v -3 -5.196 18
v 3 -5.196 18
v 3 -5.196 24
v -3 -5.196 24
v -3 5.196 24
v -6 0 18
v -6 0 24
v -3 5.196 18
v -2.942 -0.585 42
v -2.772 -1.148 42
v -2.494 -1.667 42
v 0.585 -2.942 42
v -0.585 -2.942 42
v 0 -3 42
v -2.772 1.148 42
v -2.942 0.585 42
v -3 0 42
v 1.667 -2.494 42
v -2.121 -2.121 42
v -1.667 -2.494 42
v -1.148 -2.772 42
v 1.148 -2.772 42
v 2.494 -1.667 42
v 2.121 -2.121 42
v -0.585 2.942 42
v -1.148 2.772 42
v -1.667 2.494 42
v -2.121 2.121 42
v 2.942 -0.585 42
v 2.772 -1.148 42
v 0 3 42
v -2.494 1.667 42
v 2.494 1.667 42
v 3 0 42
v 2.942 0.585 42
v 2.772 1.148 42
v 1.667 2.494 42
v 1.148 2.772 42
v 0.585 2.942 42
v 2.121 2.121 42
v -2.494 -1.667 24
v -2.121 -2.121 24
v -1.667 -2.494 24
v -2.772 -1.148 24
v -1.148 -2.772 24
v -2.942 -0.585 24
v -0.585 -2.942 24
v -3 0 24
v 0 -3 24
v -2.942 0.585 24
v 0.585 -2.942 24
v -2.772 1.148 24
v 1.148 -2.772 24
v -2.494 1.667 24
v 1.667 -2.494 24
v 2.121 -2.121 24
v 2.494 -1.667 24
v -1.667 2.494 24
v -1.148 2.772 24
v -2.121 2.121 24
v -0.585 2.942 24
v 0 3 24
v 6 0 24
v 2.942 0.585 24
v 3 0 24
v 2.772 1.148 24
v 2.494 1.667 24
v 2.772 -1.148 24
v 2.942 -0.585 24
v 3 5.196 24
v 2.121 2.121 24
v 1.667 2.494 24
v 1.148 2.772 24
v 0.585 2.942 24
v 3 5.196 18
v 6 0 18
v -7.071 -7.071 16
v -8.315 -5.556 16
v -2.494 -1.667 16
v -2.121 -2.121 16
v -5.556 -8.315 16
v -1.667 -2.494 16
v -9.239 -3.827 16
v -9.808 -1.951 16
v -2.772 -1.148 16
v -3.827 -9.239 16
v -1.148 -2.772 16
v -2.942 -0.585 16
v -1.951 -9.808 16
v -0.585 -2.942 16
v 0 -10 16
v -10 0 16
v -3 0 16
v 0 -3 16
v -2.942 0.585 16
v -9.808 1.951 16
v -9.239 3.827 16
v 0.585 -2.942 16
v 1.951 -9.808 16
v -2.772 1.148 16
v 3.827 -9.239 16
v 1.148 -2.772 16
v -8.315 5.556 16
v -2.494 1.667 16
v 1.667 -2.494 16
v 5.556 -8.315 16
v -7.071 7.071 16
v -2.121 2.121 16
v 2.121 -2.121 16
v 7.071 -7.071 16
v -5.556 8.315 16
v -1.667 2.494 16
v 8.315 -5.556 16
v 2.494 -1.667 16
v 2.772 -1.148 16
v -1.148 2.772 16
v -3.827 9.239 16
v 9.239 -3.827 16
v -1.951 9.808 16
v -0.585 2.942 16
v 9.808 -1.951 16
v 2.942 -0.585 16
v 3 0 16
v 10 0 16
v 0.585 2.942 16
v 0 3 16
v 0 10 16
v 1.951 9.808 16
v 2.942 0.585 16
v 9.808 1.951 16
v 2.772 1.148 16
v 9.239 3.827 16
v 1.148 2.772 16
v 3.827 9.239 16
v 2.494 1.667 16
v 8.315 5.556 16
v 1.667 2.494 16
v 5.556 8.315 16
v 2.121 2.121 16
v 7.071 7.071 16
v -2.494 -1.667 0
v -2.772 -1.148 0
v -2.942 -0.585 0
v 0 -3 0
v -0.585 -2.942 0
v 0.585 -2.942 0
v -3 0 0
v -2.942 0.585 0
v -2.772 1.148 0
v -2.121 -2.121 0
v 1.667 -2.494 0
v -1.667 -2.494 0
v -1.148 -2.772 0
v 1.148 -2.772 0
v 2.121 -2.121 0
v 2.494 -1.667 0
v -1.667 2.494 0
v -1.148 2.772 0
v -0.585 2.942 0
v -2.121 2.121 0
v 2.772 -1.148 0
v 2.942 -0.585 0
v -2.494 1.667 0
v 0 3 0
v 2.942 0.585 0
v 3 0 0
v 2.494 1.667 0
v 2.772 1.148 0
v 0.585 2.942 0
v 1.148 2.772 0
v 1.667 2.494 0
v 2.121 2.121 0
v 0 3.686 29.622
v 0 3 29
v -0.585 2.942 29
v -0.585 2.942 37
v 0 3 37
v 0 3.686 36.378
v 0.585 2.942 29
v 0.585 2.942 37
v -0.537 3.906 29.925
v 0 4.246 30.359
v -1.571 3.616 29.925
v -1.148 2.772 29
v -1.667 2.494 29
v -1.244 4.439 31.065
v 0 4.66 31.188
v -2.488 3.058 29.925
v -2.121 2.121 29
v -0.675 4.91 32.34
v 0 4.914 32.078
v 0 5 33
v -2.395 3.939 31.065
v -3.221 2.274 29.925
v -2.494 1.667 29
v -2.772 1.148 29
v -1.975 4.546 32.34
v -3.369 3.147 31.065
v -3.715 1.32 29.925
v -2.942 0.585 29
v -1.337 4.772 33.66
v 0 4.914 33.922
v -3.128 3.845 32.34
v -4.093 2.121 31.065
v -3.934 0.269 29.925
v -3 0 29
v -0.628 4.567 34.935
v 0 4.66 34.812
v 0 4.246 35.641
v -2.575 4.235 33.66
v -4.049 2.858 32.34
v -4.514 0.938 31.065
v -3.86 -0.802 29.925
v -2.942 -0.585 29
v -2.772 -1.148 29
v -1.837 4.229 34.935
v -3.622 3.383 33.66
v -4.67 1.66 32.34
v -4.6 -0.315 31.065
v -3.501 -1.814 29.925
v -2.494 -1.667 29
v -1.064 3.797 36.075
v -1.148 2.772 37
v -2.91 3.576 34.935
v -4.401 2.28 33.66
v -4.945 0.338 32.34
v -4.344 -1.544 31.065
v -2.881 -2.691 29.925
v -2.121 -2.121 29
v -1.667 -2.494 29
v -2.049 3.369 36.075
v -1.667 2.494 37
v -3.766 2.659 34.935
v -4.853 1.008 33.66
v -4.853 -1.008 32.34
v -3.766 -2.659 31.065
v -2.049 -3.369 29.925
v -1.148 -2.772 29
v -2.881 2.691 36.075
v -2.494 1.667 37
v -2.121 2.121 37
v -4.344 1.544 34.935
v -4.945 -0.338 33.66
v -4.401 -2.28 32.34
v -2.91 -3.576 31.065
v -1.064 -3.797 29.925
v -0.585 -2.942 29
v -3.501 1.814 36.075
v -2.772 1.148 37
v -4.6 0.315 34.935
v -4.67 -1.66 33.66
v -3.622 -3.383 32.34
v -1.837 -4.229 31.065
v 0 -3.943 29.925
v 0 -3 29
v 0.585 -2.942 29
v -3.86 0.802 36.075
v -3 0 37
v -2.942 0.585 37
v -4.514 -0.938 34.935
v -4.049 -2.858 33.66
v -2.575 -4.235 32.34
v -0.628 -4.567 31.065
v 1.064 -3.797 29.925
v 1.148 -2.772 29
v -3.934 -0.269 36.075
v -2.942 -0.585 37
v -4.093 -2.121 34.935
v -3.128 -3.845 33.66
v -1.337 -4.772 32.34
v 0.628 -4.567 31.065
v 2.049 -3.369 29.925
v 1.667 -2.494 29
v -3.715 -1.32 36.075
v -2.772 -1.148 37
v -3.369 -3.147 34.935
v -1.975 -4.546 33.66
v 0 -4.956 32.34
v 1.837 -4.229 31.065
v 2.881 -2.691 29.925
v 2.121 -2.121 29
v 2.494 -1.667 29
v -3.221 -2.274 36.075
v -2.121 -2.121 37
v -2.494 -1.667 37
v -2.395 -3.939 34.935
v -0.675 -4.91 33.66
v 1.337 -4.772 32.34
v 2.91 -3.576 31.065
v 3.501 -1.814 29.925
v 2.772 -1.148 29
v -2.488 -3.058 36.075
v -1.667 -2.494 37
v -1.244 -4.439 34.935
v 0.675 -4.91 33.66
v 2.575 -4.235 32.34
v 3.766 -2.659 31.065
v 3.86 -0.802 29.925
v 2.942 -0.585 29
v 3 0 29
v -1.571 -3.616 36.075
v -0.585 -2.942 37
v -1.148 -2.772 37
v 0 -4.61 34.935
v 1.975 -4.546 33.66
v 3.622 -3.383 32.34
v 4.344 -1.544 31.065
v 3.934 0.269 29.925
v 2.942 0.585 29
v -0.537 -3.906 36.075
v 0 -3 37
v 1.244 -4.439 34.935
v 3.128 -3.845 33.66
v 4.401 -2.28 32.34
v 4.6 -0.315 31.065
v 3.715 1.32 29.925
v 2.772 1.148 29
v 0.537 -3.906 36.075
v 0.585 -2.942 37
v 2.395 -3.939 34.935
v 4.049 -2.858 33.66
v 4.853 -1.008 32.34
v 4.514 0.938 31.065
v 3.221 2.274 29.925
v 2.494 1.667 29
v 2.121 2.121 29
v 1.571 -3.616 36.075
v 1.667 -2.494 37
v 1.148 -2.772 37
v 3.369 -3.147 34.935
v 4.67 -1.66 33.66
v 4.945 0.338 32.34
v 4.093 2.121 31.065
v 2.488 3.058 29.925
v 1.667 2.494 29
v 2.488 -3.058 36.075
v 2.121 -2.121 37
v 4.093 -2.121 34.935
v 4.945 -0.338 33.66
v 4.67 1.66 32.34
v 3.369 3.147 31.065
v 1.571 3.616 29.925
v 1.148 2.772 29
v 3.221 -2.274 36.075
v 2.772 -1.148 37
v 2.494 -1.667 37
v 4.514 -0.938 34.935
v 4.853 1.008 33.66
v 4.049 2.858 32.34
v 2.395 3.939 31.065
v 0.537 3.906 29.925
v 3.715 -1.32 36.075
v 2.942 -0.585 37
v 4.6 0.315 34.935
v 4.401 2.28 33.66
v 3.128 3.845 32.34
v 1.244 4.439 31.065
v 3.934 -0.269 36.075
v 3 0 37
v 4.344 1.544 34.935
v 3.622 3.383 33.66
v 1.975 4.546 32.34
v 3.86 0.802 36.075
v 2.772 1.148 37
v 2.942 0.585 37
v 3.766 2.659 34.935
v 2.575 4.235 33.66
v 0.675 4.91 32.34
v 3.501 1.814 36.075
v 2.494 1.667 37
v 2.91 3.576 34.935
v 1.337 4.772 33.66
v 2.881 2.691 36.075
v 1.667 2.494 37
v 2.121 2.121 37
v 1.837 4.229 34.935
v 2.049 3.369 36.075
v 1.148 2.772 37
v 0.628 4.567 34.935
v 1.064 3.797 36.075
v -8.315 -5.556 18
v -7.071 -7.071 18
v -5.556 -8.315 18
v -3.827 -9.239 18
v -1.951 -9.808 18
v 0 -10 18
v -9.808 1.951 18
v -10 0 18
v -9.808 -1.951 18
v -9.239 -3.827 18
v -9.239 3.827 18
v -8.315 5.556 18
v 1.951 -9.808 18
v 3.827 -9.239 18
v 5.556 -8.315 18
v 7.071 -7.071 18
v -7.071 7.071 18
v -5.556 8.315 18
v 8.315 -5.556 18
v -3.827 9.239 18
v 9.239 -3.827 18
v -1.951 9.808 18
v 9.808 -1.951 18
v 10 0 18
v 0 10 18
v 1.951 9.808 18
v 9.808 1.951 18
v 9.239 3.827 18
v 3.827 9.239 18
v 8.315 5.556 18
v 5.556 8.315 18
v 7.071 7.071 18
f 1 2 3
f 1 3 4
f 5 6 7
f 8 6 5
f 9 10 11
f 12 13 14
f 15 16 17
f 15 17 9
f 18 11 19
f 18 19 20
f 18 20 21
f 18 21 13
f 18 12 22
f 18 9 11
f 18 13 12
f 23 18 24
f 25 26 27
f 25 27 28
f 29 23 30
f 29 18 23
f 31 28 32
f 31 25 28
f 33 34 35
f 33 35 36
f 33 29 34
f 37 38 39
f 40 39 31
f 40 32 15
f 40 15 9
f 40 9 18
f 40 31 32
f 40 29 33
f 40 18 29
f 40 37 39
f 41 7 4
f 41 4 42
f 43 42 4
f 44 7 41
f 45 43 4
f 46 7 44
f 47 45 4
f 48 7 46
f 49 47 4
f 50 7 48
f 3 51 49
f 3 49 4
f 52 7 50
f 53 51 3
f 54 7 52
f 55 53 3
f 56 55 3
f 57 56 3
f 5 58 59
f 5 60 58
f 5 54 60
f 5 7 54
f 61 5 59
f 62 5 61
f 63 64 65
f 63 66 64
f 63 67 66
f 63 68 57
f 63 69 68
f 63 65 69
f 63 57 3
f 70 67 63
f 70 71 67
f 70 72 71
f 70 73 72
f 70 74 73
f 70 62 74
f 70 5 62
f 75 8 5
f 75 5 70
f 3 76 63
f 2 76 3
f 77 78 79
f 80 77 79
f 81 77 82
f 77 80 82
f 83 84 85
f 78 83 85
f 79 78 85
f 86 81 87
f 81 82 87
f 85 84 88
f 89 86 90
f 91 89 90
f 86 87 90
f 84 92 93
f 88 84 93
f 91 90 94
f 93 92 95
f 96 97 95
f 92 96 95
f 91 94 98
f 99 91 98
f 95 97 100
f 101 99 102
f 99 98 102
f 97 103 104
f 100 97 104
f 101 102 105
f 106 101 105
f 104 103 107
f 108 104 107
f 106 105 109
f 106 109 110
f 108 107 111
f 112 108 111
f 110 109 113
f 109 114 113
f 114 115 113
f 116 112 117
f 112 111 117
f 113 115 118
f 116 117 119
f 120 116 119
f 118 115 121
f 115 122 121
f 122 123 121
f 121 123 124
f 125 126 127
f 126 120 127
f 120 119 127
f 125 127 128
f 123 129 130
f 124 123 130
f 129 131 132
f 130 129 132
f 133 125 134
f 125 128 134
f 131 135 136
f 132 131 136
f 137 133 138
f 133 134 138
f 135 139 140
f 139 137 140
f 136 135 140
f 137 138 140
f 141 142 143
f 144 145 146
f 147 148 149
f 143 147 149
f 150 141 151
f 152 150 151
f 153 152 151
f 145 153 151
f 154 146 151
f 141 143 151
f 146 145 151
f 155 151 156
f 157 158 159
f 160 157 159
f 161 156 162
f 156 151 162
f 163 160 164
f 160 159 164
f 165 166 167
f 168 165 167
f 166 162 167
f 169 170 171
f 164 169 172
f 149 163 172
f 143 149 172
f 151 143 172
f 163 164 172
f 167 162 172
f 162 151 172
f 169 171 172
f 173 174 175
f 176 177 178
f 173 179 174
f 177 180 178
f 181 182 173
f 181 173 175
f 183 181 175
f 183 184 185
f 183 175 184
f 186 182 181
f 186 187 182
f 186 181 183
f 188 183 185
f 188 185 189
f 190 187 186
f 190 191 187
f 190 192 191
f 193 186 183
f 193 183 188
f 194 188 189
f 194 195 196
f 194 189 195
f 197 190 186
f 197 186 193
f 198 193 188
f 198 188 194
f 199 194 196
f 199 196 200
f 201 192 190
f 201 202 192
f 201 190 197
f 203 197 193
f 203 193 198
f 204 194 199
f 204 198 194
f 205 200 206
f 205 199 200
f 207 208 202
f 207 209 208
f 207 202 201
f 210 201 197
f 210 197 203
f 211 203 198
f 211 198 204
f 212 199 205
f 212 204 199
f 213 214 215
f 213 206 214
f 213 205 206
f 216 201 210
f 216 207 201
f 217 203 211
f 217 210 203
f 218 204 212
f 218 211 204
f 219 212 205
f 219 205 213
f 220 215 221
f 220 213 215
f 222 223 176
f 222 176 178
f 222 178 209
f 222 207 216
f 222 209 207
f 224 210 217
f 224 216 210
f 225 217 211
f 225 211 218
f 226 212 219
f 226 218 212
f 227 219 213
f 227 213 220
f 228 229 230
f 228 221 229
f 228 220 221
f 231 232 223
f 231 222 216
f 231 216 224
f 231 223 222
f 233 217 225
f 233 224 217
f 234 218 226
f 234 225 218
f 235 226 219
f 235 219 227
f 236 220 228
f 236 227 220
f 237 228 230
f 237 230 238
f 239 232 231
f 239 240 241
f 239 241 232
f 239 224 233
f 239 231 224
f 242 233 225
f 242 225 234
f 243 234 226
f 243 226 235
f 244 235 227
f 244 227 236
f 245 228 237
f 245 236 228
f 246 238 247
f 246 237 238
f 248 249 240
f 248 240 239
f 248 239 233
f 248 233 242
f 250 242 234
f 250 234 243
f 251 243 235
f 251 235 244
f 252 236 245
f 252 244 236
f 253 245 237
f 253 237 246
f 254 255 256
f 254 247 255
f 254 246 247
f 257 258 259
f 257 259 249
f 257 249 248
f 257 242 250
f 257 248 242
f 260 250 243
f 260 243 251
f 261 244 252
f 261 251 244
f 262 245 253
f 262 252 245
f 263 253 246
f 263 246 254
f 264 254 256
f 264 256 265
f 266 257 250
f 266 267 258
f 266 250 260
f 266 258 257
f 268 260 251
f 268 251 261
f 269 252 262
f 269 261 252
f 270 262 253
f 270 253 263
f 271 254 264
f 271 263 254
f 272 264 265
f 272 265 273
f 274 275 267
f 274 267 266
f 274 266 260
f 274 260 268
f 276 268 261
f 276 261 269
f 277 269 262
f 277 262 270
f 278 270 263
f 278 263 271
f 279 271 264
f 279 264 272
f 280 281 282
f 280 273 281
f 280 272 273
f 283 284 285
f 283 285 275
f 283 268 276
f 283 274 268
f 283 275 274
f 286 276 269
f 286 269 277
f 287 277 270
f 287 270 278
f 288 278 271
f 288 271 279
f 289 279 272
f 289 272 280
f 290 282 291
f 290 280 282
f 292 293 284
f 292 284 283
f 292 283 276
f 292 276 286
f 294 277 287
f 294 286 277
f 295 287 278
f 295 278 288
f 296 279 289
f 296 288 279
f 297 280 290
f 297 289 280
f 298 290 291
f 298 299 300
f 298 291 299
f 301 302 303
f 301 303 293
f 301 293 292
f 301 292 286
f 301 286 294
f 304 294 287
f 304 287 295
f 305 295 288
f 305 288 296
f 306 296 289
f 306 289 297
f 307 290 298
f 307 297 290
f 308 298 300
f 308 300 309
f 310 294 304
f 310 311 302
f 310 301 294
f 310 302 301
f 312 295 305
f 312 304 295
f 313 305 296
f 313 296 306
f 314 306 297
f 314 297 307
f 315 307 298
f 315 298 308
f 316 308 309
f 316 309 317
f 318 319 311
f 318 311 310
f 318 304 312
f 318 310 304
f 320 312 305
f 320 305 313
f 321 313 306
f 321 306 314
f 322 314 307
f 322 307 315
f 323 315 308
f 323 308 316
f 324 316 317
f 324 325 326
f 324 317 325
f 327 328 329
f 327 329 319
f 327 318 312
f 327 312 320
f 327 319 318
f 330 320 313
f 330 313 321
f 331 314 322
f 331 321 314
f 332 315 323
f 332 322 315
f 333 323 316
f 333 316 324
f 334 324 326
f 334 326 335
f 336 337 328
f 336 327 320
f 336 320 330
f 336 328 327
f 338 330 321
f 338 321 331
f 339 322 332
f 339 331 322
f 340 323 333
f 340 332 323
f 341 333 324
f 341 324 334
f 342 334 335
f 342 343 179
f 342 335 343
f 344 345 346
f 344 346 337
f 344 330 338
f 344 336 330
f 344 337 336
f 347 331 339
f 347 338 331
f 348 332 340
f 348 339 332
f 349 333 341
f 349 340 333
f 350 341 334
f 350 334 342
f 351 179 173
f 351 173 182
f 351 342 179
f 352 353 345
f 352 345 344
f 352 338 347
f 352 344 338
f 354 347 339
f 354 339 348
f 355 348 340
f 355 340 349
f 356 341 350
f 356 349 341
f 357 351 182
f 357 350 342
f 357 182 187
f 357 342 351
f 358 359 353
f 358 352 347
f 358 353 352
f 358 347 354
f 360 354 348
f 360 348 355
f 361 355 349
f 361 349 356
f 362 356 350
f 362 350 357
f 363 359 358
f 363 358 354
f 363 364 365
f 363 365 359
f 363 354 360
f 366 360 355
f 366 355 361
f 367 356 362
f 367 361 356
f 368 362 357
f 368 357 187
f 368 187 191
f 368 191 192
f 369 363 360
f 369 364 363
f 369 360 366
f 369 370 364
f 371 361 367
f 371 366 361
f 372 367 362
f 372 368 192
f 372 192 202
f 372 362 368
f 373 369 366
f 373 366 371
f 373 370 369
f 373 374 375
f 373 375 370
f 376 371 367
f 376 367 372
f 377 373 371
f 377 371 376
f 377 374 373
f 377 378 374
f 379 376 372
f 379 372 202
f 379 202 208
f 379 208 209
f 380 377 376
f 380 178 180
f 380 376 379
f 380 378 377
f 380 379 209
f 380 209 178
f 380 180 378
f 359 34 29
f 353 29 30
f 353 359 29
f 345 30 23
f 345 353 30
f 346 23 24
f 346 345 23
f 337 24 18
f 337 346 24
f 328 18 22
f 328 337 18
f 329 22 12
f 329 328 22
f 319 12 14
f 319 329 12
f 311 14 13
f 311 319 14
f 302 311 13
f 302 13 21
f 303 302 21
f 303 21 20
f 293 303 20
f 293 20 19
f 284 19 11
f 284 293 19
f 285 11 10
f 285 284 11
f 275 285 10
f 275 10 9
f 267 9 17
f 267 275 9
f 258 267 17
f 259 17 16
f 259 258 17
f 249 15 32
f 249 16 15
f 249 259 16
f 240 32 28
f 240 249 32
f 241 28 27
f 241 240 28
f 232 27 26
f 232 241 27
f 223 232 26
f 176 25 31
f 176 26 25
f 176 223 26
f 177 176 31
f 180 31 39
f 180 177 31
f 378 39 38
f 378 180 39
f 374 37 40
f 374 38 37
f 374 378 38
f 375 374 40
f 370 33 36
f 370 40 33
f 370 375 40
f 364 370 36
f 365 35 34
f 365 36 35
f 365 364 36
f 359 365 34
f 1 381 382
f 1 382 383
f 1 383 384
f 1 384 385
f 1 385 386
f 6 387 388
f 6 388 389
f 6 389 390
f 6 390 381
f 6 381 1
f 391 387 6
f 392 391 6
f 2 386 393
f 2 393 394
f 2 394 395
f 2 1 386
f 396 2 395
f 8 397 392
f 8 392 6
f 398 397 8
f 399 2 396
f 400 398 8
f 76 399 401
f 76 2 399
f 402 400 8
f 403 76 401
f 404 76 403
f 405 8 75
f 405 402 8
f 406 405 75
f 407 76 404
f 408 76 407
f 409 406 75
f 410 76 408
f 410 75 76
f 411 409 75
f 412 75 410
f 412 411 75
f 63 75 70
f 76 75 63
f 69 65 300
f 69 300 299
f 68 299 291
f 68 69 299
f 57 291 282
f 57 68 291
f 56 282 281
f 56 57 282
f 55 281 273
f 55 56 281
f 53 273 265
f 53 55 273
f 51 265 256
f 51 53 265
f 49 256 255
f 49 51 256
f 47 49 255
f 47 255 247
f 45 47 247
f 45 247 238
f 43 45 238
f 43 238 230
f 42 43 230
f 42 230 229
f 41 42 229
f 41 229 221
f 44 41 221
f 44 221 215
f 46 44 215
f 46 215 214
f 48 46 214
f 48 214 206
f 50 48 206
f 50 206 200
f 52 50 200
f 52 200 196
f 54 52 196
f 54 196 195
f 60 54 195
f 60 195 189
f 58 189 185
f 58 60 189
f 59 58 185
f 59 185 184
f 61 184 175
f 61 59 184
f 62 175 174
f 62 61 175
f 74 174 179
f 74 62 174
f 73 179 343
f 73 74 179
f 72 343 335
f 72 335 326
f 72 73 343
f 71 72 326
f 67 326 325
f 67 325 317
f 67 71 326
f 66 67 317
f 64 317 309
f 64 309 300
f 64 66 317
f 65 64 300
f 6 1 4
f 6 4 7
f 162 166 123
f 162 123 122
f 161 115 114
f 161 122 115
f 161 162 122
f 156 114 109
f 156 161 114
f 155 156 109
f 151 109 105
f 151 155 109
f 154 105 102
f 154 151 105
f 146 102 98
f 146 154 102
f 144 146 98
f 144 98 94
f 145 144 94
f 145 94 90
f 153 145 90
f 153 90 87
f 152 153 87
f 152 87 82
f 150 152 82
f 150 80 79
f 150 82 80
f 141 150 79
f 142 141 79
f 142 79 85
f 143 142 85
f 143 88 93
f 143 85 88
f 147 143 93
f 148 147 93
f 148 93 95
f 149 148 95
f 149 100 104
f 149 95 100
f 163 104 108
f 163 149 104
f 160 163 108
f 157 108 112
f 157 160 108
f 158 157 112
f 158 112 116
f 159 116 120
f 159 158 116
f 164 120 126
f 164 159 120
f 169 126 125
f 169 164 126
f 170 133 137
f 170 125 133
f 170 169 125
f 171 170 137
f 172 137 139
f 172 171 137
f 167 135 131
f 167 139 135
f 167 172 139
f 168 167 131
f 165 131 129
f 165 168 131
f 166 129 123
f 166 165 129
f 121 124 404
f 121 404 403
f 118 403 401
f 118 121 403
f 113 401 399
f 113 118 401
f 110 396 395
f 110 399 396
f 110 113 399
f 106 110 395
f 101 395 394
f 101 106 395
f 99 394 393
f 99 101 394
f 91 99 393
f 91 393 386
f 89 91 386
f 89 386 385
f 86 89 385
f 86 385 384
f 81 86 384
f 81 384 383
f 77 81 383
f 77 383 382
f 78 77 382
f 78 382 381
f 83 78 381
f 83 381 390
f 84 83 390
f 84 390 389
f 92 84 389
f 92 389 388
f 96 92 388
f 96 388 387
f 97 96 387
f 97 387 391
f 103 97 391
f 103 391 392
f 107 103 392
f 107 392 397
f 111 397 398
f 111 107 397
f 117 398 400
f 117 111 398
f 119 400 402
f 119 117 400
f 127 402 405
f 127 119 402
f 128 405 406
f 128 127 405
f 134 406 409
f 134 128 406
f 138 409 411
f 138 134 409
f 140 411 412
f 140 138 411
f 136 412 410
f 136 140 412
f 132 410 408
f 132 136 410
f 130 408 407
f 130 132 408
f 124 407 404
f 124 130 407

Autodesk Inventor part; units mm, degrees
ref_plane "YZ Plane" through (0, 0, 0) normal (1, 0, 0) x (0, 1, 0)
ref_plane "XZ Plane" through (0, 0, 0) normal (0, 1, 0) x (-1, 0, 0)
ref_plane "XY Plane" through (0, 0, 0) normal (0, 0, 1) x (1, 0, 0)
sketch "Boceto1" plane through (0, 0, 0) normal (0, 0, 1) x (1, 0, 0)
  circle A0 centre (0, 0) radius 3
  dimension "d0" = 6
extrude "Extrusión1" add sketch "Boceto1" along normal blind 16
sketch "Boceto2" plane through (0, 0, 16) normal (0, 0, 1) x (1, 0, 0)
  circle A0 centre (0, 0) radius 10
  dimension "d3" = 20
extrude "Extrusión2" add sketch "Boceto2" along normal blind 2
sketch "Boceto3" plane through (0, 0, 18) normal (0, 0, 1) x (1, 0, 0)
  circle A0 centre (0, 0) radius 3 projected
  line L0 (6, 0) -> (3, -5.1962)
  line L1 (3, -5.1962) -> (-3, -5.1962)
  line L2 (-3, -5.1962) -> (-6, 0)
  line L3 (-6, 0) -> (-3, 5.1962)
  line L4 (-3, 5.1962) -> (3, 5.1962)
  line L5 (3, 5.1962) -> (6, 0)
  dimension "d6" = 6
extrude "Extrusión3" add sketch "Boceto3" along normal blind 6 contours A0 | L0 L1 L2 L3 L4 L5
sketch "Boceto4" plane through (0, 0, 24) normal (0, 0, 1) x (1, 0, 0)
  circle A0 centre (0, 0) radius 3
  dimension "d9" = 6
extrude "Extrusión4" add sketch "Boceto4" along normal blind 18
sketch "Boceto5" plane through (0, 0, 0) normal (1, 0, 0) x (0, 1, 0)
  line L0 (3, 42) -> (-3, 42) projected
  line L1 (-3, 24) -> (3, 24) projected
  arc A0 (0, 28) -> (0, 38) centre (0, 33) ccw
  line L2 (3, 24) -> (3, 42) projected
  line L3 (-3, 24) -> (-3, 42) projected
  line L4 (0, 43.0217) -> (0, 25.7964)
  point P0 (0, 0)
  point P1 (3, 33)
  point P2 (0, 24)
  dimension "d12" = 10
revolve "Revolución1" add sketch "Boceto5" angle 360 about axis through (0, 0, 43.0217) along (0, 0, -1) contours L2 A0 L4 | A0 L2
properties part number "front_plate_screw"
